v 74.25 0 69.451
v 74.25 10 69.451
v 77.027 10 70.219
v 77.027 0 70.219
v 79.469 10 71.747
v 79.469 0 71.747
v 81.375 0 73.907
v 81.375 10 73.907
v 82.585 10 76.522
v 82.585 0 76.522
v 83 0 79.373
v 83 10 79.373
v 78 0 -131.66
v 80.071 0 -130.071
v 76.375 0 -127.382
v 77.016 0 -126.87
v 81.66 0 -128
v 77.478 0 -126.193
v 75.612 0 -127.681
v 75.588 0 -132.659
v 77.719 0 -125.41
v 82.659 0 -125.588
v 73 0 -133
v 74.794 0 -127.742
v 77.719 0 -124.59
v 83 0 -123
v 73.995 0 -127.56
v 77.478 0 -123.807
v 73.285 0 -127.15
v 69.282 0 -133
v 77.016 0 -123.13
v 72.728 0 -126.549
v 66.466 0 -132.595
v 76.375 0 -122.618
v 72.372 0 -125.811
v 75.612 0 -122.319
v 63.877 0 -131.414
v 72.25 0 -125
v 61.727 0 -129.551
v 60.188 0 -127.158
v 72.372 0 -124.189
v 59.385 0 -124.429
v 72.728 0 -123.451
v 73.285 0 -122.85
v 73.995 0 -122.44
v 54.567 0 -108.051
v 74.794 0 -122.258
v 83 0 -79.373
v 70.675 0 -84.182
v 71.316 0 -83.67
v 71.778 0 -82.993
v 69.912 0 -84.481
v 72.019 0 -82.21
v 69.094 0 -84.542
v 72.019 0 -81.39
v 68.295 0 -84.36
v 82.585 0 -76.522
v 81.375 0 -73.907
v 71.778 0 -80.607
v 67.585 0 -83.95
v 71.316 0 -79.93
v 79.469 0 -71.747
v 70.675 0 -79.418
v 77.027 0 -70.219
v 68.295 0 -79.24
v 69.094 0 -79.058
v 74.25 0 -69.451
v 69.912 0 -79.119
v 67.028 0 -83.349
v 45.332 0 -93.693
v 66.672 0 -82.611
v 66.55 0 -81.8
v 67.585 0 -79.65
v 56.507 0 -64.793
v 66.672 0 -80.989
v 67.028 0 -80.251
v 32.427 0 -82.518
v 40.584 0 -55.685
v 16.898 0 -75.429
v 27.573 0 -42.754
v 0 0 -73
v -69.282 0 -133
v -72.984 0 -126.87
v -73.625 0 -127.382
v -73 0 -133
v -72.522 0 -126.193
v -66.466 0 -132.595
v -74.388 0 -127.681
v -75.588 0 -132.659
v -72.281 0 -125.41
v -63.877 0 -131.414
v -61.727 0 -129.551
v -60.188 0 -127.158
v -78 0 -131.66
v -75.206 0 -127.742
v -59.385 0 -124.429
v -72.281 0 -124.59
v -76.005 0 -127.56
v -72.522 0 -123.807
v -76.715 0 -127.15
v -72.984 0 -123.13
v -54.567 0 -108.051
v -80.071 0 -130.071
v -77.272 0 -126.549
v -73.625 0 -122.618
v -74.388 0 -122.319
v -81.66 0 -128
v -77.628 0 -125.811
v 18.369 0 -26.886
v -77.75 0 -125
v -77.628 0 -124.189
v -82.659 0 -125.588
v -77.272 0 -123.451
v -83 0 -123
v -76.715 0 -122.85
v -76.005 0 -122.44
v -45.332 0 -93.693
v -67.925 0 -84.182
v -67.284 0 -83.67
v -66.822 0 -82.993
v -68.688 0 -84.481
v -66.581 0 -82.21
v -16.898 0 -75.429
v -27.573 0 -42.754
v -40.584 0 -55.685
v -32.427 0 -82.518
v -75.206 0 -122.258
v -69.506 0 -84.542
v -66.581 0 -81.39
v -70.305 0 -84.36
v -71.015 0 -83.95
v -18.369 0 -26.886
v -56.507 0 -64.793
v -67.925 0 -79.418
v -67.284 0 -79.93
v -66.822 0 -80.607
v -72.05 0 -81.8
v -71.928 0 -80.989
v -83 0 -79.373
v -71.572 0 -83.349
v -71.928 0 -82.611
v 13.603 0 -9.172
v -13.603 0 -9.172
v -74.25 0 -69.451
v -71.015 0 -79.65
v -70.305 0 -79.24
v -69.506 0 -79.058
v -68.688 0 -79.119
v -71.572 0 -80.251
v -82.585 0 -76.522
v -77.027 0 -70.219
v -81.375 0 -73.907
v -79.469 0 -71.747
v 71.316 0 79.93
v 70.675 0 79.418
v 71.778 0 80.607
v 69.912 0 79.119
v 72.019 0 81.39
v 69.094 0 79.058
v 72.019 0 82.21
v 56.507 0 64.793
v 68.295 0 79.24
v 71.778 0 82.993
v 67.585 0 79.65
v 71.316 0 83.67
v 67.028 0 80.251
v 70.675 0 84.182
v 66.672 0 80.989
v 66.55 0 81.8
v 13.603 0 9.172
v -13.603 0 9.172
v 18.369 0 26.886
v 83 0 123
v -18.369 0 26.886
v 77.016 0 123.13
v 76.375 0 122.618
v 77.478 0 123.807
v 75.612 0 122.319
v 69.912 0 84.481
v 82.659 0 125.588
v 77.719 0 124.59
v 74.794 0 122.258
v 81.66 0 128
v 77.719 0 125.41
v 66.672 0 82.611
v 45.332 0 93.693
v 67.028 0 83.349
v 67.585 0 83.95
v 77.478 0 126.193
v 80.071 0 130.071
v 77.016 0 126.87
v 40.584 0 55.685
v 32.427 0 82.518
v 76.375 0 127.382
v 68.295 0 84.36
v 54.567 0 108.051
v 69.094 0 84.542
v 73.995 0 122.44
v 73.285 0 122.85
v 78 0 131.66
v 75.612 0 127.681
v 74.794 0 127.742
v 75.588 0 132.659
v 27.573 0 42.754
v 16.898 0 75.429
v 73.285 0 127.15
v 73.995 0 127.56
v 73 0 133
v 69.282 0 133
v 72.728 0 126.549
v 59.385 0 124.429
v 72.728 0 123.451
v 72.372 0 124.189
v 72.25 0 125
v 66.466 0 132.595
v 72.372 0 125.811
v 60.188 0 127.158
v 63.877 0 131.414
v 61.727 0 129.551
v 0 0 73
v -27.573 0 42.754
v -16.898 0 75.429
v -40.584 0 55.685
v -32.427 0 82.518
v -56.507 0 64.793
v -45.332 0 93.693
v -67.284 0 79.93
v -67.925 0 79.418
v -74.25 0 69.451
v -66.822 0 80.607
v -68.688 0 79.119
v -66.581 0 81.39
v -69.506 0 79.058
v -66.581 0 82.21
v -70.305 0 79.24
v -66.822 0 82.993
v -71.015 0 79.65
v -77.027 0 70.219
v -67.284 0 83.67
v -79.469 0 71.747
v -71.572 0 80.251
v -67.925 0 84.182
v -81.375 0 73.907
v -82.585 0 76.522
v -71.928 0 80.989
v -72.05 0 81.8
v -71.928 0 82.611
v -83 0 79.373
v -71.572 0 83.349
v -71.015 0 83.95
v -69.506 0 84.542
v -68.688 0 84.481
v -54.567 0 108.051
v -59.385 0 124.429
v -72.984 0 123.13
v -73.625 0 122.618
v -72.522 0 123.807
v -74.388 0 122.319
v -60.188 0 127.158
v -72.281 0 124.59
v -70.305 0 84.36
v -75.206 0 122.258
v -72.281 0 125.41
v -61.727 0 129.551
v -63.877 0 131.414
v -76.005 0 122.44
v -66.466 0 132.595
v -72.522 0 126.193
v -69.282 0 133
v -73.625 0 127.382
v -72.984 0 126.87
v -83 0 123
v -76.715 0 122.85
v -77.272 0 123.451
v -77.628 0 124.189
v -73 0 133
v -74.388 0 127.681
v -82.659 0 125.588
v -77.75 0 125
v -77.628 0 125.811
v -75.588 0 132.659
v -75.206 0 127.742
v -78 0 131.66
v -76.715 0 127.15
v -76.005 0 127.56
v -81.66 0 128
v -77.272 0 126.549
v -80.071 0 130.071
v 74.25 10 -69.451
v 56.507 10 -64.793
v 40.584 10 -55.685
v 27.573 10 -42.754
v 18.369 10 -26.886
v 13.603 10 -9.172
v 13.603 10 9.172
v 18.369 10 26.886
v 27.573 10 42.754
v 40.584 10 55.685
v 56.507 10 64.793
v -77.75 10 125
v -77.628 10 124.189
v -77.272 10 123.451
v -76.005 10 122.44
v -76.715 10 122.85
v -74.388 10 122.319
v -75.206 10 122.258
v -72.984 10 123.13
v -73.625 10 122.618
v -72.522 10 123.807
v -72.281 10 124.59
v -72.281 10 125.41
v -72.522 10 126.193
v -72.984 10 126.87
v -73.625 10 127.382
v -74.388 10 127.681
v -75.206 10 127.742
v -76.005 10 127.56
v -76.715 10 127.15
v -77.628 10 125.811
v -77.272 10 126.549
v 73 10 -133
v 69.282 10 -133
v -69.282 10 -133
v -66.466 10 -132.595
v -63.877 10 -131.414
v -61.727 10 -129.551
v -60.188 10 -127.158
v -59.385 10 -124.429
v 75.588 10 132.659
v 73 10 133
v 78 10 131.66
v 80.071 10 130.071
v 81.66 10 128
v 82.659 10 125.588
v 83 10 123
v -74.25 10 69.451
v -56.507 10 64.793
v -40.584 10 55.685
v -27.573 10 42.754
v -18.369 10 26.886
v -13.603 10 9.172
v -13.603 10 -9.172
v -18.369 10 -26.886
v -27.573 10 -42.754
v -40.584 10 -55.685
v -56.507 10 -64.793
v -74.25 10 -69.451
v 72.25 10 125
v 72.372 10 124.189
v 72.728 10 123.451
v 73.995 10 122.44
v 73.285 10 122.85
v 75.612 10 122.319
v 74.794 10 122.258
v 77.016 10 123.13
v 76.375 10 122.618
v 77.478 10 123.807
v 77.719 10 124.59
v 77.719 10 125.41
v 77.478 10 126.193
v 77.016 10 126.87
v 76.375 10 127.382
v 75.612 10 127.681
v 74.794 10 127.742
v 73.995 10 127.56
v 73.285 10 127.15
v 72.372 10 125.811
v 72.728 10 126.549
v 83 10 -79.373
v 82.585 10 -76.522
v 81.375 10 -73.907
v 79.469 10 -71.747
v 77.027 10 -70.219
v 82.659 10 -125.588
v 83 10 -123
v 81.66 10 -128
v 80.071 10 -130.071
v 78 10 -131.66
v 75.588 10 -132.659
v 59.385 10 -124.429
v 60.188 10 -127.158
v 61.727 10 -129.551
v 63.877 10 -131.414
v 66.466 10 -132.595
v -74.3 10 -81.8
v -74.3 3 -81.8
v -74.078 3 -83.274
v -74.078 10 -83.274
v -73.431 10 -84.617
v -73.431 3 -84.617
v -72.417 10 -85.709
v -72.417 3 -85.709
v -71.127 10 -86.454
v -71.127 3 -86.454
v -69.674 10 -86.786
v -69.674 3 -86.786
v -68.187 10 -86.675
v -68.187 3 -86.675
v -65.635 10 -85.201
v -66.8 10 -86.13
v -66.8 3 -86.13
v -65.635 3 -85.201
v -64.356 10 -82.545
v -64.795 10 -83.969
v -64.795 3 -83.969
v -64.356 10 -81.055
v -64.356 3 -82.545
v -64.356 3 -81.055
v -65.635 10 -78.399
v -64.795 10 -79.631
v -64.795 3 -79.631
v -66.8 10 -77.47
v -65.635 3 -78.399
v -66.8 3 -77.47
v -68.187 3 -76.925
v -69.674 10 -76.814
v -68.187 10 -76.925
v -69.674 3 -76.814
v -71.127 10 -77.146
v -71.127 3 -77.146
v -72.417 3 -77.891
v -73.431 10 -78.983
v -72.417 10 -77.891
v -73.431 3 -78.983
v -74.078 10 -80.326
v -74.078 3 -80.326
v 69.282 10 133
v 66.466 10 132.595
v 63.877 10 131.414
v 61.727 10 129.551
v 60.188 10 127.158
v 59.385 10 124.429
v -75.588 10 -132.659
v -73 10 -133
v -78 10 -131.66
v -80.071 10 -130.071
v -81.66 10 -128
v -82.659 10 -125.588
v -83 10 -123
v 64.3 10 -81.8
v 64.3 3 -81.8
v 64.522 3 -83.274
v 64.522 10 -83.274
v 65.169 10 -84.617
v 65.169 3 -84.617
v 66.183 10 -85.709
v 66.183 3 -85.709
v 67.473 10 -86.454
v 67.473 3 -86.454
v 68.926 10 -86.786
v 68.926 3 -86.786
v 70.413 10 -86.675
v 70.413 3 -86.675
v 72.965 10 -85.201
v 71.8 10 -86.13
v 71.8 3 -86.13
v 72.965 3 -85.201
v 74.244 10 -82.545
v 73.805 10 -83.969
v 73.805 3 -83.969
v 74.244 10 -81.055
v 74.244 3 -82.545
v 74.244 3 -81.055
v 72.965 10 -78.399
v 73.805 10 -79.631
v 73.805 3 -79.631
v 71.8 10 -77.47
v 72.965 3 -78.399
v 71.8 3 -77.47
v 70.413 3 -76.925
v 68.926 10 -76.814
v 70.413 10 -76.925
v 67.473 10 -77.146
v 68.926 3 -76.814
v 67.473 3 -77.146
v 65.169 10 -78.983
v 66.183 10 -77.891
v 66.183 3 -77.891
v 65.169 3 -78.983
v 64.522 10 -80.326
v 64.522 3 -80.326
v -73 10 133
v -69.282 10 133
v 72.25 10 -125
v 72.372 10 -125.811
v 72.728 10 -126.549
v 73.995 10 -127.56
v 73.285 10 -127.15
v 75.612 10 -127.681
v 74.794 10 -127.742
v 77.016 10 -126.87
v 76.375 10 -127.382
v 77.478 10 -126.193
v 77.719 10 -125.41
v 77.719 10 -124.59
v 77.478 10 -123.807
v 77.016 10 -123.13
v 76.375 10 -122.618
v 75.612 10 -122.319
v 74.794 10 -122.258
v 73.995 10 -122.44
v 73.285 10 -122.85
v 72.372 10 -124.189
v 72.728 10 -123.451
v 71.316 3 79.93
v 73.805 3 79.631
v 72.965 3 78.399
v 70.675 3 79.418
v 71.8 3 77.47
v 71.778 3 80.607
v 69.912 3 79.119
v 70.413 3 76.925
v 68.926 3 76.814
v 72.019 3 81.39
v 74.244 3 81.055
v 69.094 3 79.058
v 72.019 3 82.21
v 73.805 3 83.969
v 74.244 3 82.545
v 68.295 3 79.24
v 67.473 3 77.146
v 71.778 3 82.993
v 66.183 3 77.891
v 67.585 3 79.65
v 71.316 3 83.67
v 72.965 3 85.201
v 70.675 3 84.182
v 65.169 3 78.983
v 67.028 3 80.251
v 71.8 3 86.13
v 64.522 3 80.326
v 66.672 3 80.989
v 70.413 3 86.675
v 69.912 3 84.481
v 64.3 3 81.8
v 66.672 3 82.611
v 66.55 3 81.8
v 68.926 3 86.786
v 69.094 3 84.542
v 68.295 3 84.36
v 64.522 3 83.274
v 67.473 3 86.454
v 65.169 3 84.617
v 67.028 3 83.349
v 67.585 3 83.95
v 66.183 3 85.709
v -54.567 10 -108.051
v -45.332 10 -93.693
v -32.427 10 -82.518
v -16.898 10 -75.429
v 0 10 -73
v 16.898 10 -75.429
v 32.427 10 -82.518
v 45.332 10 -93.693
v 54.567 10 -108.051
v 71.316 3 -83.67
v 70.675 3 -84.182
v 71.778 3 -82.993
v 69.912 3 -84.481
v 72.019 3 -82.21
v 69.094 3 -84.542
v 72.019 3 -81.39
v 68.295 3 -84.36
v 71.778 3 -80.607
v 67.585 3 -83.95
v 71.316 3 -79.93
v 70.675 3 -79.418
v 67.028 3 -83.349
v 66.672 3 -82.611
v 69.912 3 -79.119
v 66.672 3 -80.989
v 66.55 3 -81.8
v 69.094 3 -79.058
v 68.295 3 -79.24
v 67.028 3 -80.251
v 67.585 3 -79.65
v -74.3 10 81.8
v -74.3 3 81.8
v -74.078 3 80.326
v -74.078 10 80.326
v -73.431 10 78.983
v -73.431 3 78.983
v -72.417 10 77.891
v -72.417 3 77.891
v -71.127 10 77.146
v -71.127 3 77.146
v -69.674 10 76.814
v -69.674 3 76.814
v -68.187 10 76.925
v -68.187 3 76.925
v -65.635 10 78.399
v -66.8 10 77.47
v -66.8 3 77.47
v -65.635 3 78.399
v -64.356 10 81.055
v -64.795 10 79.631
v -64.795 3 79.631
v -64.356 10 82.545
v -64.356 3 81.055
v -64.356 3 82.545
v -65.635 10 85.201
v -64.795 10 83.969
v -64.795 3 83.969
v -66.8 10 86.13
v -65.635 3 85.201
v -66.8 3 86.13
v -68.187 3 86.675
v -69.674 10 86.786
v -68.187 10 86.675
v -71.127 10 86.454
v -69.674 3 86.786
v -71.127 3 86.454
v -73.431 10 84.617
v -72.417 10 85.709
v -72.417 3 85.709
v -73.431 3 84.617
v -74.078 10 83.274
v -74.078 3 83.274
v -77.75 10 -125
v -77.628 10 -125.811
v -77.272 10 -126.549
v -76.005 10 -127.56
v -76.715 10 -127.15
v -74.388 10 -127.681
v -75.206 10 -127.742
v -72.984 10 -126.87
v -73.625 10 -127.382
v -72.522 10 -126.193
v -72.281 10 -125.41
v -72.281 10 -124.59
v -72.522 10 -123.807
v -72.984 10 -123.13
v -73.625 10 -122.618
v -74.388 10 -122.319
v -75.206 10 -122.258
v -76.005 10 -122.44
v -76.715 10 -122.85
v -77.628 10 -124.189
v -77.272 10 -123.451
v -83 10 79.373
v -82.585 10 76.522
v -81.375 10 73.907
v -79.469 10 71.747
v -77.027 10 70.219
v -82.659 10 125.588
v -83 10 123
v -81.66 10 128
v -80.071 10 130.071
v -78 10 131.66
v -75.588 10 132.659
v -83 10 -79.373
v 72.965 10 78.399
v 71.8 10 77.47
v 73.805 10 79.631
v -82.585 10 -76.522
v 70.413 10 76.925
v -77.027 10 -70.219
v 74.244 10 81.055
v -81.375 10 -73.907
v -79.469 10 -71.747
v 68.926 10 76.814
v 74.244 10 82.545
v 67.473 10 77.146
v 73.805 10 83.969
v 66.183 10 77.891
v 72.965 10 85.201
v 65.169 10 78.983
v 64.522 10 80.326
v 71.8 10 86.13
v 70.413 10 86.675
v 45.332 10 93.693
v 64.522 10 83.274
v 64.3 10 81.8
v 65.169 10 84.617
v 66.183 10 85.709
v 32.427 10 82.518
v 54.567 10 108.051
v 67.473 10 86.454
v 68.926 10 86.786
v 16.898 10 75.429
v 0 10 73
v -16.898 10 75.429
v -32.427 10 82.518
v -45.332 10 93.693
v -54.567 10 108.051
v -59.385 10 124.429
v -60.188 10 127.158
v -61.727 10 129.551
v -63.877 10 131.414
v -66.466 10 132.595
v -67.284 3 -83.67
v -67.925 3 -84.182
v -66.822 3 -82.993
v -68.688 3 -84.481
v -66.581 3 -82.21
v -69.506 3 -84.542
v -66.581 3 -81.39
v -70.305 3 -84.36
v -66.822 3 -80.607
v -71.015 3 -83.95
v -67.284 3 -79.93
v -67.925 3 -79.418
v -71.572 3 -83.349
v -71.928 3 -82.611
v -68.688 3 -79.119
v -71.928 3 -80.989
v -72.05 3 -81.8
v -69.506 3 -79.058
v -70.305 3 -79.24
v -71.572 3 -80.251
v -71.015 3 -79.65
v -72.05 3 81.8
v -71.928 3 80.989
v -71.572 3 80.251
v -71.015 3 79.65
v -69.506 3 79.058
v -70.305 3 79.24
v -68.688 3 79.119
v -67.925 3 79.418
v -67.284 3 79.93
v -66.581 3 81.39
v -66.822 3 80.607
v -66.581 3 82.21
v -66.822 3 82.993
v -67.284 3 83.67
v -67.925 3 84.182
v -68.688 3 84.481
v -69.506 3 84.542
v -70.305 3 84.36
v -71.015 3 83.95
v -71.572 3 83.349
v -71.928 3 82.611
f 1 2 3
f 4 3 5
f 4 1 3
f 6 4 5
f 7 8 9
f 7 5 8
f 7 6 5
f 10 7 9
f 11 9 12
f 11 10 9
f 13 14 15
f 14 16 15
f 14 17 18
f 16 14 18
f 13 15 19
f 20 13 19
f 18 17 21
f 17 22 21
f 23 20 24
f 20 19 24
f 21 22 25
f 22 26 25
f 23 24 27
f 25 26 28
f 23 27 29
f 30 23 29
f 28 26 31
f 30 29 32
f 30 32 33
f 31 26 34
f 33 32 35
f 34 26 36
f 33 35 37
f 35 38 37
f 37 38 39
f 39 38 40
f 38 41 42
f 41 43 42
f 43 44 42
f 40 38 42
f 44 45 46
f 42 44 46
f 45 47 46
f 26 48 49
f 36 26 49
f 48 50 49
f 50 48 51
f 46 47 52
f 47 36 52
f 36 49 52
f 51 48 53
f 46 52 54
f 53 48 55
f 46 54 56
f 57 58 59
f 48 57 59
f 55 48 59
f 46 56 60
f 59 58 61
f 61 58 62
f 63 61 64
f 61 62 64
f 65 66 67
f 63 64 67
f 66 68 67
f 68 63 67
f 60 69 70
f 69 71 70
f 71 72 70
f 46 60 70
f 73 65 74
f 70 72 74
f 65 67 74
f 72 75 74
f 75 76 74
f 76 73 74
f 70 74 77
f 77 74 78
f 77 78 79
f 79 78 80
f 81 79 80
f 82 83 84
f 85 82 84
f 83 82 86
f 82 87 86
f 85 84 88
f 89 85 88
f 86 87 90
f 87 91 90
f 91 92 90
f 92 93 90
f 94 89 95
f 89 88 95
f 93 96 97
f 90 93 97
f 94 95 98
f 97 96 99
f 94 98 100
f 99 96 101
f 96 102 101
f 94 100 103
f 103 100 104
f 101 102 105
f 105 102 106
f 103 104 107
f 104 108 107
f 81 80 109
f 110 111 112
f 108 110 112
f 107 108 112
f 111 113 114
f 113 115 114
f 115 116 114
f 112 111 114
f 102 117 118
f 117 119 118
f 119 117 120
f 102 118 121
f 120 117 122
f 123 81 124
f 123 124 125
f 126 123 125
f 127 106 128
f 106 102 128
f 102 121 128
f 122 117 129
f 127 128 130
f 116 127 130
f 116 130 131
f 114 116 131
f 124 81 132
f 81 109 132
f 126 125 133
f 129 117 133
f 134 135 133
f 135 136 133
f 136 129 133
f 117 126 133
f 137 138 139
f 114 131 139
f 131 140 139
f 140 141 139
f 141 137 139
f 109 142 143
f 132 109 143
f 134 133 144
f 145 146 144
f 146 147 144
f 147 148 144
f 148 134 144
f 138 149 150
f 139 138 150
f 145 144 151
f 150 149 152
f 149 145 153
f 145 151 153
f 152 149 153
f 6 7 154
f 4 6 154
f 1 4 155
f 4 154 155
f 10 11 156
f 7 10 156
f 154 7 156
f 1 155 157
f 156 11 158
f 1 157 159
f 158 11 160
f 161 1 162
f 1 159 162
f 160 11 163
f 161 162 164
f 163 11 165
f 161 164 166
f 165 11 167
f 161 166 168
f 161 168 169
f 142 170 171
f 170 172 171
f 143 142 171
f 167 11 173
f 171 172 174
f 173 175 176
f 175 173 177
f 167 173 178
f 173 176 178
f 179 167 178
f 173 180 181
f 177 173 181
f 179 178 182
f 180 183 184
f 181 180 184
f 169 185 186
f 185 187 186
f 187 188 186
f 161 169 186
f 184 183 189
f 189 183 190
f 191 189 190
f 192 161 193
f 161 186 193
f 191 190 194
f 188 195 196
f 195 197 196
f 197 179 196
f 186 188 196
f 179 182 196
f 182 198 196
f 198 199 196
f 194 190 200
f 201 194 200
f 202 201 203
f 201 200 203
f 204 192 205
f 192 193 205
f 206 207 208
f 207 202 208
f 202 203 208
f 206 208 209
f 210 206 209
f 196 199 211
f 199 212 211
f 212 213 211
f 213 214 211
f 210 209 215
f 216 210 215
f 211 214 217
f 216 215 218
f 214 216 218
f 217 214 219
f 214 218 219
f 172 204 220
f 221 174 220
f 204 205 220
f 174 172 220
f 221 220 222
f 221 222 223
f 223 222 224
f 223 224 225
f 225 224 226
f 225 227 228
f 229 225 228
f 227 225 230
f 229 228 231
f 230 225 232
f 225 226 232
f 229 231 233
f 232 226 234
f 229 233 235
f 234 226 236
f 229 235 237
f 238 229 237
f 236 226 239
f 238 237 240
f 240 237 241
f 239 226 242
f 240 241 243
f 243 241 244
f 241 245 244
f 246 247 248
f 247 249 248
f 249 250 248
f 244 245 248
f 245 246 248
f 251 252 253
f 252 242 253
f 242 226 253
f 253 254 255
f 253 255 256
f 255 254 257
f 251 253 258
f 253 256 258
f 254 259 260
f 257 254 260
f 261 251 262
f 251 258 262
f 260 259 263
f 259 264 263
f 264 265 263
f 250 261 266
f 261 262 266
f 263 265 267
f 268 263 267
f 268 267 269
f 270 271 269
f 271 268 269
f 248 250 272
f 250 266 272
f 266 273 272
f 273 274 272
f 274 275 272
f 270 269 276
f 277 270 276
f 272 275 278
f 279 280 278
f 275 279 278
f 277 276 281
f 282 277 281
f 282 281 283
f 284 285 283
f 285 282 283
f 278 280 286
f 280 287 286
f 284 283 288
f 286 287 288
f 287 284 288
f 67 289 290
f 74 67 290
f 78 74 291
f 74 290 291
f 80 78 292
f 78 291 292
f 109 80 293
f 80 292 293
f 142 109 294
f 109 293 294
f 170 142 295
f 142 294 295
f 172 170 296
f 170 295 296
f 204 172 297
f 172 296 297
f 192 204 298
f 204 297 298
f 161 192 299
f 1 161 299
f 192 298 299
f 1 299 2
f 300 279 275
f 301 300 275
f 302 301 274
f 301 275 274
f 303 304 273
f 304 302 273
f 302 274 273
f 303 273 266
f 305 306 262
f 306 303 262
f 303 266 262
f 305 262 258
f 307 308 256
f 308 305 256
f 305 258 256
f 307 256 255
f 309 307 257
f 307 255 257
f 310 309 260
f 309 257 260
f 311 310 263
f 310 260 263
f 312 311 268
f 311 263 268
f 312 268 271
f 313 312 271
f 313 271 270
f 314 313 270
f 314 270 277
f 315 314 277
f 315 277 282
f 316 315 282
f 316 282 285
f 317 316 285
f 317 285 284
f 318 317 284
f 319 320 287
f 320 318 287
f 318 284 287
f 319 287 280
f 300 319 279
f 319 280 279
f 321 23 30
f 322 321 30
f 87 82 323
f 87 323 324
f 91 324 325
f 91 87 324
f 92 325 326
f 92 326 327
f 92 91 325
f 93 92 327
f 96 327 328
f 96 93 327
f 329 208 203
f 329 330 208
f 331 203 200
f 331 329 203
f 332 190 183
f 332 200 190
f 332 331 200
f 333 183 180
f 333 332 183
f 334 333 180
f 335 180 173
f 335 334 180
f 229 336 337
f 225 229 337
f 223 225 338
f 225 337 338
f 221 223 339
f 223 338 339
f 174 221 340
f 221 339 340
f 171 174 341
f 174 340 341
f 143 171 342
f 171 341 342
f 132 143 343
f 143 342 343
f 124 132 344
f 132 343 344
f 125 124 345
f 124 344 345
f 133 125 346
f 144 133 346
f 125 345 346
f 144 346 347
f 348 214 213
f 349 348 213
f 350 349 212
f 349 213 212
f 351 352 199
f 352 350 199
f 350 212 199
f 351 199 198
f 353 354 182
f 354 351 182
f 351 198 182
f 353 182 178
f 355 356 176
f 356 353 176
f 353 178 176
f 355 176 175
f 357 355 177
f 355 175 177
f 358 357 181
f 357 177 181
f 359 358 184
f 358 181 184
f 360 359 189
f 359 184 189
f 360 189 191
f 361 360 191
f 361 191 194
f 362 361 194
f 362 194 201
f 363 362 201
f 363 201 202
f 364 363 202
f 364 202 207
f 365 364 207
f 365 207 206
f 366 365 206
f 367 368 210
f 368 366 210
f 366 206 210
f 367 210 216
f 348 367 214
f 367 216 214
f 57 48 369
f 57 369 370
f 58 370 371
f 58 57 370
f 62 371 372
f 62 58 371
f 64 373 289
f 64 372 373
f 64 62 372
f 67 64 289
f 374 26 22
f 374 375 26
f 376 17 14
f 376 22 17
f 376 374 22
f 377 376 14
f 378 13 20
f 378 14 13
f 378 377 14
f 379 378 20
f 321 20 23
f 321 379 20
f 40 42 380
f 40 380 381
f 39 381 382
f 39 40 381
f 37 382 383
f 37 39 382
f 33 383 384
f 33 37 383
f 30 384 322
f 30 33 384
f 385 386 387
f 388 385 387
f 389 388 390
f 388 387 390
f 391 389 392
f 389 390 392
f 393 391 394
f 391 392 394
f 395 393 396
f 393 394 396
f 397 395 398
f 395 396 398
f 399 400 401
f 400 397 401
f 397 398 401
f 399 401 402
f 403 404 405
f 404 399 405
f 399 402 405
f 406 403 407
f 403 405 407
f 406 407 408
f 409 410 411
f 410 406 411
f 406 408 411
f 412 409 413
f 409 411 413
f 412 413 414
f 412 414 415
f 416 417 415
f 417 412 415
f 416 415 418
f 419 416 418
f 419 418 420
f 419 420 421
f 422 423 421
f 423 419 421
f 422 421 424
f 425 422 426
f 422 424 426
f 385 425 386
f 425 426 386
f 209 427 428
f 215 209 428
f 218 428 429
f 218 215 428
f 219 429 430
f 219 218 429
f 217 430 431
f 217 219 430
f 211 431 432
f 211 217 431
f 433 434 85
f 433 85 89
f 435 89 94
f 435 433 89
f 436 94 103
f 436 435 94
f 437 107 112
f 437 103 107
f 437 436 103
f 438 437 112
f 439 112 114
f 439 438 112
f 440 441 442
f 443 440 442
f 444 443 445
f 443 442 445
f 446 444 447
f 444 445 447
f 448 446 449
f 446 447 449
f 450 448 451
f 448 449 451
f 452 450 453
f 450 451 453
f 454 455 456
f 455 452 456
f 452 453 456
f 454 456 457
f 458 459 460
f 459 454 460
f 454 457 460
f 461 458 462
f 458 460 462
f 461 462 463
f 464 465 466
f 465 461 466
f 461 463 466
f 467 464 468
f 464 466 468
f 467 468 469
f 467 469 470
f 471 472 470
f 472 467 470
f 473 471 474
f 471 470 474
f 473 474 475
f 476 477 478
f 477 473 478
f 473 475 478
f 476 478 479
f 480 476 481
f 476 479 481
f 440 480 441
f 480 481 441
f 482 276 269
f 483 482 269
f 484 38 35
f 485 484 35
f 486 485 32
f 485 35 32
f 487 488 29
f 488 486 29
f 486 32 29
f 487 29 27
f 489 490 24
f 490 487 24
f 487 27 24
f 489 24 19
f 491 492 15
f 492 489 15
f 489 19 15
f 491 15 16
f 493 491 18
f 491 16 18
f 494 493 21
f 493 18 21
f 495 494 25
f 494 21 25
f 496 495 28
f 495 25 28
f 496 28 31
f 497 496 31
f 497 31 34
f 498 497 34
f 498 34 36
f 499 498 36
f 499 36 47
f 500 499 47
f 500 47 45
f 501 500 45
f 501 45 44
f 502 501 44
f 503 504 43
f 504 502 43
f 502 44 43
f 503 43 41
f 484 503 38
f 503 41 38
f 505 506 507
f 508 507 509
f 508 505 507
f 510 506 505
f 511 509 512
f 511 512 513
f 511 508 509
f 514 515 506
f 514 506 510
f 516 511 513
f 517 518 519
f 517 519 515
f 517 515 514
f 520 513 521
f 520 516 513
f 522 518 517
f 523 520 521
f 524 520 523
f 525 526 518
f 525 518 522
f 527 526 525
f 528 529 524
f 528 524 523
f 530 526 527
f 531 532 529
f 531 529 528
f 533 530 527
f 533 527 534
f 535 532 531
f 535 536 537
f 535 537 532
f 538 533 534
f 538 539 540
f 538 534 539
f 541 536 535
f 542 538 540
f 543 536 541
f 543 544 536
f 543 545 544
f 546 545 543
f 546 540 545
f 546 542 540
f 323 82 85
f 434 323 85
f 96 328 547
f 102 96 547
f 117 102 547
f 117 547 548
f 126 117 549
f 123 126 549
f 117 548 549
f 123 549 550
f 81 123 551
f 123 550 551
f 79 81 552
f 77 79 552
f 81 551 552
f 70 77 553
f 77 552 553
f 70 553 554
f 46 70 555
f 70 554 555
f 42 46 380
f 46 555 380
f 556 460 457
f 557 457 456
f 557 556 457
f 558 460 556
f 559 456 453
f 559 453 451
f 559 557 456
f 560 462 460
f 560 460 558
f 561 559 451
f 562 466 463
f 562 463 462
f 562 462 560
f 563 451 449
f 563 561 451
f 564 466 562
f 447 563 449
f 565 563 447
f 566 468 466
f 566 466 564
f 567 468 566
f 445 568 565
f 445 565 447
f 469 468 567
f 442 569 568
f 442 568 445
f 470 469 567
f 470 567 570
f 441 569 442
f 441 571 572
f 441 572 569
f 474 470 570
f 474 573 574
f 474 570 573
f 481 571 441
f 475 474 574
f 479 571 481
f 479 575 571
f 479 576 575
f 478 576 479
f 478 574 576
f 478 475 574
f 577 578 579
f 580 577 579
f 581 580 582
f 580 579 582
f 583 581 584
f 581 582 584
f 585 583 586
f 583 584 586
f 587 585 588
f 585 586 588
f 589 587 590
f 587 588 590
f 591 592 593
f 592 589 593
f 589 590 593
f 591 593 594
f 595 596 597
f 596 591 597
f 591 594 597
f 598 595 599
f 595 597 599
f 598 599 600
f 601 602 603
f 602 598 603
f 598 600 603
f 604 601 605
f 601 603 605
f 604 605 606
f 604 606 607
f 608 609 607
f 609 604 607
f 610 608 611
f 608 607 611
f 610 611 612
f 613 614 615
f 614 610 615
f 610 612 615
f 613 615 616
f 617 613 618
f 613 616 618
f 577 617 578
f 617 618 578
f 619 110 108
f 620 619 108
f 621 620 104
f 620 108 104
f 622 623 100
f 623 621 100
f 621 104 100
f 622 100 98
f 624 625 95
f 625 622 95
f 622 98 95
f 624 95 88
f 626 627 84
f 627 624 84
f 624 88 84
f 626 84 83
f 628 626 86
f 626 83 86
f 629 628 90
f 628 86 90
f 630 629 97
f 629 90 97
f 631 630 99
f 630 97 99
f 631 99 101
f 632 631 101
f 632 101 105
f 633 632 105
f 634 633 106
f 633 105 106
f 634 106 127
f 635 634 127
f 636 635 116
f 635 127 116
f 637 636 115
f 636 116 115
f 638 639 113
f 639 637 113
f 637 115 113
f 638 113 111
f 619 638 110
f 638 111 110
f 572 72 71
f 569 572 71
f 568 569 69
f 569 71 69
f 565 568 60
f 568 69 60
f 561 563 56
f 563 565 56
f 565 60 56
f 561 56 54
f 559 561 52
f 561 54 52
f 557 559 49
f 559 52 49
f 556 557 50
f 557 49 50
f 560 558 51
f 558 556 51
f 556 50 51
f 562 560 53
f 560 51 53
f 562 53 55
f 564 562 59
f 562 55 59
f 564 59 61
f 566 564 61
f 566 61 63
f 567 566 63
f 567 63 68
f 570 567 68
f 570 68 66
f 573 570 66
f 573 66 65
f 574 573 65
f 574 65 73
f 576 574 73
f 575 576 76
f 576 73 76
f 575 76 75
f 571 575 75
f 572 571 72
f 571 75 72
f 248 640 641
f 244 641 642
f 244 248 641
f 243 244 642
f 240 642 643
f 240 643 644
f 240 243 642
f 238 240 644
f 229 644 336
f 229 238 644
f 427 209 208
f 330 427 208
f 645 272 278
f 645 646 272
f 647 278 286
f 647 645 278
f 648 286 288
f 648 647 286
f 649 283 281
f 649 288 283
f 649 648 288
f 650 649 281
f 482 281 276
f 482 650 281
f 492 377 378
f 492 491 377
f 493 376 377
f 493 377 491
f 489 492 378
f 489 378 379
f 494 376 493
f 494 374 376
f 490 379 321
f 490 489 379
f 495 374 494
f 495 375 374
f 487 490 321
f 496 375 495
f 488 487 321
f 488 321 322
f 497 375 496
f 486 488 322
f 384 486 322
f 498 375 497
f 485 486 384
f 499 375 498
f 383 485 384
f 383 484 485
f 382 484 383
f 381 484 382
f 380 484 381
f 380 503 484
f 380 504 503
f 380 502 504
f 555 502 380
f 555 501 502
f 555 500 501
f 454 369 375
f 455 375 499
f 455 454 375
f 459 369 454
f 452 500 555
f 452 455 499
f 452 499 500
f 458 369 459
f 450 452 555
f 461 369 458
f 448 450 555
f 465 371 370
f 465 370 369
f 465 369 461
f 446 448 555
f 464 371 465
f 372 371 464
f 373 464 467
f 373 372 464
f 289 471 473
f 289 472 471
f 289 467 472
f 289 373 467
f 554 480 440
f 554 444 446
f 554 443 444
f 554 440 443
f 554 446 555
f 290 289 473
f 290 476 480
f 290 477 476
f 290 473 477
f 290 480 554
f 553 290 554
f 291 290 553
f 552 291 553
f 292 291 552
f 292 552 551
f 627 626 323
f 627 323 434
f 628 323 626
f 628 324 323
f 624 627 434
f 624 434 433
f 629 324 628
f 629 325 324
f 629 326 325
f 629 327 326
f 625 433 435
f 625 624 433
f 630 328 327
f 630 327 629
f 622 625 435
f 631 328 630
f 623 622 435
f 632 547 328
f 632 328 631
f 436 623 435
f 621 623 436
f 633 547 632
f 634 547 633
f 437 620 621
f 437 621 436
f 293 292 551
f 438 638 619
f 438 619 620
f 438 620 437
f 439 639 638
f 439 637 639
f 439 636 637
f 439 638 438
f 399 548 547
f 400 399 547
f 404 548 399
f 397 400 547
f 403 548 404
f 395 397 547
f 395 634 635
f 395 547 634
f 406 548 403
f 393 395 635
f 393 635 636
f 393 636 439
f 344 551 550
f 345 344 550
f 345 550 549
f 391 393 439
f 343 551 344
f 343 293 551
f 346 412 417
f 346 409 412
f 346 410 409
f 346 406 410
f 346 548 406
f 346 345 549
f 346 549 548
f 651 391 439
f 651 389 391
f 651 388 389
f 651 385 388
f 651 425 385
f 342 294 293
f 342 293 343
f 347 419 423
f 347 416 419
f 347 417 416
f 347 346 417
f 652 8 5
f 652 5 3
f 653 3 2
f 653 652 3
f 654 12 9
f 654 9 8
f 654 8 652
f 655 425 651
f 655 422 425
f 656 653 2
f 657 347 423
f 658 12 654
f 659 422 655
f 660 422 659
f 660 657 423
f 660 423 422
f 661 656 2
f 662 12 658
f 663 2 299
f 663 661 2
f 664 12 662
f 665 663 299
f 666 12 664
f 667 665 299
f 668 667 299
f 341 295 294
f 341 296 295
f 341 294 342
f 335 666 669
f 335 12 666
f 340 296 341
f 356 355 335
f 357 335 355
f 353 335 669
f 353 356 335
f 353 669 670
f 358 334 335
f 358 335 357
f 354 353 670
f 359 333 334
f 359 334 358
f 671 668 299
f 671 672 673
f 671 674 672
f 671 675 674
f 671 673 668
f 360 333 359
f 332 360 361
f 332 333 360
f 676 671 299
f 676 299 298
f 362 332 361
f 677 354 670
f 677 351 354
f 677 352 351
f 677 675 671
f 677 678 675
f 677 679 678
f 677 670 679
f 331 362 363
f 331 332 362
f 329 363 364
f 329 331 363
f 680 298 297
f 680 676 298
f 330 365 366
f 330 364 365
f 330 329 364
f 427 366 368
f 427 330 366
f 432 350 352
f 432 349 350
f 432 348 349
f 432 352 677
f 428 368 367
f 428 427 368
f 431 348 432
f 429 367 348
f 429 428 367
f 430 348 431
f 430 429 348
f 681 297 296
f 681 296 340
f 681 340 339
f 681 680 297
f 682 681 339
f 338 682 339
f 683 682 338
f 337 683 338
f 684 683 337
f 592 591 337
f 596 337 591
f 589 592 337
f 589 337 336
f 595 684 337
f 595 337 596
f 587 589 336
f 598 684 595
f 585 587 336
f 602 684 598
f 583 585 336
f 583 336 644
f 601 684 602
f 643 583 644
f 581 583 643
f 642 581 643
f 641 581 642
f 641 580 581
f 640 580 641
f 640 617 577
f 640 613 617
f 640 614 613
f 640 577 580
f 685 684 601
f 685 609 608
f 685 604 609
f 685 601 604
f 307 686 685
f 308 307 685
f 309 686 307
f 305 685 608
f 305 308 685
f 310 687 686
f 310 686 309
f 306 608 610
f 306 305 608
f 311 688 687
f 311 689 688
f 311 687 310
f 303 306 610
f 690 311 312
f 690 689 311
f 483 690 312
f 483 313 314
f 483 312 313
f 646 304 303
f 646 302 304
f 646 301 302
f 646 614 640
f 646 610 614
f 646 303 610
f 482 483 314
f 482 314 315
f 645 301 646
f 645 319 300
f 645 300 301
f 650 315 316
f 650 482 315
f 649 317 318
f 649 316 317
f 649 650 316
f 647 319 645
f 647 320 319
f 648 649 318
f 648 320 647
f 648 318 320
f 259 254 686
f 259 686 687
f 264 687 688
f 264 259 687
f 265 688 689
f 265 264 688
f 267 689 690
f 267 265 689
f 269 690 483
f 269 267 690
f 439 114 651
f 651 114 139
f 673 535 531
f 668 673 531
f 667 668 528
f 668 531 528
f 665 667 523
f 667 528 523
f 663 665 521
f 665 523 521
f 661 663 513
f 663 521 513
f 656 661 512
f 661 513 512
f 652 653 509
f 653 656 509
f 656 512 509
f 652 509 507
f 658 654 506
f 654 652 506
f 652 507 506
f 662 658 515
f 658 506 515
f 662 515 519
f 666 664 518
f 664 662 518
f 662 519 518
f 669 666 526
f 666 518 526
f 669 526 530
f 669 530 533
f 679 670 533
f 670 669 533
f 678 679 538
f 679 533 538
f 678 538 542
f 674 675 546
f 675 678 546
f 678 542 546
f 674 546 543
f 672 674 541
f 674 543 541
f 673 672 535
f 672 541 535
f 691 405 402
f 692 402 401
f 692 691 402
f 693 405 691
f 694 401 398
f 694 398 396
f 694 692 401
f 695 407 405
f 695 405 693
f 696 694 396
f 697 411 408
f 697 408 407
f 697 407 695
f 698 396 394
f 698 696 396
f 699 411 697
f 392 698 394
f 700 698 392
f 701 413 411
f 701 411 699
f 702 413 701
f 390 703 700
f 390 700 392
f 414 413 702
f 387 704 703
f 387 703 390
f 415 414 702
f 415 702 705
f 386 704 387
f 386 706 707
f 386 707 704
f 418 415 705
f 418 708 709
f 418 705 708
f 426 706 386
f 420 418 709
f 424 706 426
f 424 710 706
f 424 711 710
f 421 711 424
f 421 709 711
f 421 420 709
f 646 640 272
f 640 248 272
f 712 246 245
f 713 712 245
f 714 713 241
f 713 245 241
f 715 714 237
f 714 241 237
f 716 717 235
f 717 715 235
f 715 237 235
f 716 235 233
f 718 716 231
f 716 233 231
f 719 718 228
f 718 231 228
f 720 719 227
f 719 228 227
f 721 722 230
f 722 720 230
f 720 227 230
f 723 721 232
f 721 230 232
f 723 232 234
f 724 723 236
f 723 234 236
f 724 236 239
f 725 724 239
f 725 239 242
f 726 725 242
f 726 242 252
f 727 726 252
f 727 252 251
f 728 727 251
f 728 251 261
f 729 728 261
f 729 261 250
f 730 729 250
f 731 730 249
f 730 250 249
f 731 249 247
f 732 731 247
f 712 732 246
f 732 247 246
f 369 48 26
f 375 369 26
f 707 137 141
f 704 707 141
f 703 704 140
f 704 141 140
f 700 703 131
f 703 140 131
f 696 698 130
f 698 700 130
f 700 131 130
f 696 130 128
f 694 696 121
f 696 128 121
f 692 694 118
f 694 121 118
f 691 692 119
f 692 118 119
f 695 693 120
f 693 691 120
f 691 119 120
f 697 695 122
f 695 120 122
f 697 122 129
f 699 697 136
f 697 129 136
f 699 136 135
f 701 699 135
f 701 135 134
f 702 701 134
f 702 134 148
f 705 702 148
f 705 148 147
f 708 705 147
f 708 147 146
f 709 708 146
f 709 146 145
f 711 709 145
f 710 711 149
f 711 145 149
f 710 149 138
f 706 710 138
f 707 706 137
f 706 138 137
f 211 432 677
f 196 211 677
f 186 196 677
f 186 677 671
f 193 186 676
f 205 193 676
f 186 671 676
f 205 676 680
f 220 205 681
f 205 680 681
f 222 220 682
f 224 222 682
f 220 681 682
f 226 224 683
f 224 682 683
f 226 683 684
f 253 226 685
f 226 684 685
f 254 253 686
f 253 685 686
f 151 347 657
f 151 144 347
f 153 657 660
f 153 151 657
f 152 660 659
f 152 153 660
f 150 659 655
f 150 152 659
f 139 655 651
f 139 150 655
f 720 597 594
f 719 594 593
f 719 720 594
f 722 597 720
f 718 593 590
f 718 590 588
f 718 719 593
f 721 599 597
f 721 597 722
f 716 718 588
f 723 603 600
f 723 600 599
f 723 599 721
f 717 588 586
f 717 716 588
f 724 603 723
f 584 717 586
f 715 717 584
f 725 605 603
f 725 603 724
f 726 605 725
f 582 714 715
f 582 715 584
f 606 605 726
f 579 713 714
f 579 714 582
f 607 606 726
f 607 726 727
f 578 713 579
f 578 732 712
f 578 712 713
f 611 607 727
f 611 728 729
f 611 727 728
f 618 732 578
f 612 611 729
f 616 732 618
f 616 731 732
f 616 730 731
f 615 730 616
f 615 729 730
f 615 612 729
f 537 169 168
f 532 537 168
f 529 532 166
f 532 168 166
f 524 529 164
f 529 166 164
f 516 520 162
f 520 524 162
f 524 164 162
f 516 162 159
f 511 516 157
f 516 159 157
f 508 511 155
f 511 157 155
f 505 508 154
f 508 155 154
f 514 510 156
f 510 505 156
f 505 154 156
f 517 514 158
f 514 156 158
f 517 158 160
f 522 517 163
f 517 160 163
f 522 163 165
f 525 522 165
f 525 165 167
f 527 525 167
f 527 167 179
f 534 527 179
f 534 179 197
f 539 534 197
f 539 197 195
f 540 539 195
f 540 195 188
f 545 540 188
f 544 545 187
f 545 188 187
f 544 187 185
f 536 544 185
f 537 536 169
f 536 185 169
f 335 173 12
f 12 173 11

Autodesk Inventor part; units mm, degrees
ref_plane "YZ Plane" through (0, 0, 0) normal (1, 0, 0) x (0, 1, 0)
ref_plane "XZ Plane" through (0, 0, 0) normal (0, 1, 0) x (-1, 0, 0)
ref_plane "XY Plane" through (0, 0, 0) normal (0, 0, 1) x (1, 0, 0)
sketch "Sketch1" plane through (0, 0, 0) normal (0, 1, 0) x (-1, 0, 0)
  circle A0 centre (69.3, 81.8) radius 2.75
  circle A1 centre (69.3, -81.8) radius 2.75
  circle A2 centre (-69.3, -81.8) radius 2.75
  circle A3 centre (-69.3, 81.8) radius 2.75
  line L0 (69.3, 81.8) -> (-69.3, 81.8) construction
  line L1 (69.3, 81.8) -> (69.3, -81.8) construction
  line L2 (69.3, -81.8) -> (-69.3, -81.8) construction
  line L3 (0, 0) -> (69.3, 0) construction
  line L4 (-83, -133) -> (83, -133)
  line L5 (83, -133) -> (83, 133)
  line L6 (83, 133) -> (-83, 133)
  line L7 (-83, 133) -> (-83, -133)
  line L8 (-83, -133) -> (83, 133) construction
  line L9 (83, -133) -> (-83, 133) construction
  circle A4 centre (75, 125) radius 2.75
  circle A5 centre (-75, 125) radius 2.75
  circle A6 centre (-75, -125) radius 2.75
  circle A7 centre (75, -125) radius 2.75
  line L10 (75, 125) -> (-75, 125) construction
  line L11 (-75, 125) -> (-75, -125) construction
  line L12 (75, -125) -> (-75, -125) construction
  circle A8 centre (69.3, 81.8) radius 5
  circle A9 centre (-69.3, 81.8) radius 5
  circle A10 centre (-69.3, -81.8) radius 5
  circle A11 centre (69.3, -81.8) radius 5
  point P0 (0, 81.8)
  dimension "d0" = 163.6
  dimension "d1" = 5.5
  dimension "d2" = 138.6
  dimension "d3" = 69.3
  dimension "d4" = 5.5
  dimension "d5" = 10
  dimension "d7" = 250
  dimension "d8" = 8
  dimension "d9" = 8
  dimension "d10" = 8
  dimension "d11" = 8
  dimension "d12" = 8
  dimension "d13" = 150
extrude "Extrusion1" add sketch "Sketch1" along normal blind 10 contours L7 L6 L5 L4
extrude "Extrusion2" add sketch "Sketch1" along normal blind 3 contours A8 | A9 | A10 | A11
sketch "Sketch2" plane through (0, 10, 0) normal (0, 1, 0) x (1, 0, 0)
  line L0 (-83, 133) -> (-83, -133) projected
  line L1 (-83, -133) -> (83, -133) projected
  line L2 (83, -133) -> (83, 133) projected
  line L3 (83, 133) -> (-83, 133) projected
  circle A0 centre (-75, -125) radius 2.75 projected
  circle A1 centre (75, -125) radius 2.75 projected
  circle A2 centre (75, 125) radius 2.75 projected
  circle A3 centre (-75, 125) radius 2.75 projected
  circle A4 centre (-69.3, 81.8) radius 5 projected
  circle A5 centre (69.3, 81.8) radius 5 projected
  circle A6 centre (69.3, -81.8) radius 5 projected
  circle A7 centre (-69.3, -81.8) radius 5 projected
  arc A8 (60, -133) -> (-60, -133) centre (0, -133) ccw
  line L4 (0, -73) -> (0, -133) construction
  arc A9 (83, 70) -> (83, -70) centre (83, 0) ccw
  line L5 (13, 0) -> (83, 0) construction
  line L6 (83, -133) -> (83, 133) construction
  arc A10 (-83, -70) -> (-83, 70) centre (-83, 0) ccw
  arc A11 (-60, 133) -> (60, 133) centre (0, 133) ccw
  point P0 (0, 0)
  point P1 (-60, 133)
  point P2 (60, 133)
  point P3 (-83, 70)
  dimension "d18" = 70
  dimension "d19" = 60
extrude "Extrusion3" cut sketch "Sketch2" against normal through all contours A10 L0 | L3 A11 | A8 L1 | L2 A9
fillet "Fillet1" radius 10 12 edges at (60, 5, 133) (-60, 5, 133) (83, 5, 133) (83, 5, -70) (83, 5, 70) (-83, 5, 133) (-83, 5, 70) (-83, 5, -70) (-83, 5, -133) (60, 5, -133) (-60, 5, -133) (83, 5, -133)
equation "\"d3\" = 0.5 * d2"
equation "\"d9\" = d8"
equation "\"d10\" = d9"
equation "\"d11\" = d8"
equation "\"d12\" = d8"
properties part number "Spincoater Base Mount_3DPrint"
